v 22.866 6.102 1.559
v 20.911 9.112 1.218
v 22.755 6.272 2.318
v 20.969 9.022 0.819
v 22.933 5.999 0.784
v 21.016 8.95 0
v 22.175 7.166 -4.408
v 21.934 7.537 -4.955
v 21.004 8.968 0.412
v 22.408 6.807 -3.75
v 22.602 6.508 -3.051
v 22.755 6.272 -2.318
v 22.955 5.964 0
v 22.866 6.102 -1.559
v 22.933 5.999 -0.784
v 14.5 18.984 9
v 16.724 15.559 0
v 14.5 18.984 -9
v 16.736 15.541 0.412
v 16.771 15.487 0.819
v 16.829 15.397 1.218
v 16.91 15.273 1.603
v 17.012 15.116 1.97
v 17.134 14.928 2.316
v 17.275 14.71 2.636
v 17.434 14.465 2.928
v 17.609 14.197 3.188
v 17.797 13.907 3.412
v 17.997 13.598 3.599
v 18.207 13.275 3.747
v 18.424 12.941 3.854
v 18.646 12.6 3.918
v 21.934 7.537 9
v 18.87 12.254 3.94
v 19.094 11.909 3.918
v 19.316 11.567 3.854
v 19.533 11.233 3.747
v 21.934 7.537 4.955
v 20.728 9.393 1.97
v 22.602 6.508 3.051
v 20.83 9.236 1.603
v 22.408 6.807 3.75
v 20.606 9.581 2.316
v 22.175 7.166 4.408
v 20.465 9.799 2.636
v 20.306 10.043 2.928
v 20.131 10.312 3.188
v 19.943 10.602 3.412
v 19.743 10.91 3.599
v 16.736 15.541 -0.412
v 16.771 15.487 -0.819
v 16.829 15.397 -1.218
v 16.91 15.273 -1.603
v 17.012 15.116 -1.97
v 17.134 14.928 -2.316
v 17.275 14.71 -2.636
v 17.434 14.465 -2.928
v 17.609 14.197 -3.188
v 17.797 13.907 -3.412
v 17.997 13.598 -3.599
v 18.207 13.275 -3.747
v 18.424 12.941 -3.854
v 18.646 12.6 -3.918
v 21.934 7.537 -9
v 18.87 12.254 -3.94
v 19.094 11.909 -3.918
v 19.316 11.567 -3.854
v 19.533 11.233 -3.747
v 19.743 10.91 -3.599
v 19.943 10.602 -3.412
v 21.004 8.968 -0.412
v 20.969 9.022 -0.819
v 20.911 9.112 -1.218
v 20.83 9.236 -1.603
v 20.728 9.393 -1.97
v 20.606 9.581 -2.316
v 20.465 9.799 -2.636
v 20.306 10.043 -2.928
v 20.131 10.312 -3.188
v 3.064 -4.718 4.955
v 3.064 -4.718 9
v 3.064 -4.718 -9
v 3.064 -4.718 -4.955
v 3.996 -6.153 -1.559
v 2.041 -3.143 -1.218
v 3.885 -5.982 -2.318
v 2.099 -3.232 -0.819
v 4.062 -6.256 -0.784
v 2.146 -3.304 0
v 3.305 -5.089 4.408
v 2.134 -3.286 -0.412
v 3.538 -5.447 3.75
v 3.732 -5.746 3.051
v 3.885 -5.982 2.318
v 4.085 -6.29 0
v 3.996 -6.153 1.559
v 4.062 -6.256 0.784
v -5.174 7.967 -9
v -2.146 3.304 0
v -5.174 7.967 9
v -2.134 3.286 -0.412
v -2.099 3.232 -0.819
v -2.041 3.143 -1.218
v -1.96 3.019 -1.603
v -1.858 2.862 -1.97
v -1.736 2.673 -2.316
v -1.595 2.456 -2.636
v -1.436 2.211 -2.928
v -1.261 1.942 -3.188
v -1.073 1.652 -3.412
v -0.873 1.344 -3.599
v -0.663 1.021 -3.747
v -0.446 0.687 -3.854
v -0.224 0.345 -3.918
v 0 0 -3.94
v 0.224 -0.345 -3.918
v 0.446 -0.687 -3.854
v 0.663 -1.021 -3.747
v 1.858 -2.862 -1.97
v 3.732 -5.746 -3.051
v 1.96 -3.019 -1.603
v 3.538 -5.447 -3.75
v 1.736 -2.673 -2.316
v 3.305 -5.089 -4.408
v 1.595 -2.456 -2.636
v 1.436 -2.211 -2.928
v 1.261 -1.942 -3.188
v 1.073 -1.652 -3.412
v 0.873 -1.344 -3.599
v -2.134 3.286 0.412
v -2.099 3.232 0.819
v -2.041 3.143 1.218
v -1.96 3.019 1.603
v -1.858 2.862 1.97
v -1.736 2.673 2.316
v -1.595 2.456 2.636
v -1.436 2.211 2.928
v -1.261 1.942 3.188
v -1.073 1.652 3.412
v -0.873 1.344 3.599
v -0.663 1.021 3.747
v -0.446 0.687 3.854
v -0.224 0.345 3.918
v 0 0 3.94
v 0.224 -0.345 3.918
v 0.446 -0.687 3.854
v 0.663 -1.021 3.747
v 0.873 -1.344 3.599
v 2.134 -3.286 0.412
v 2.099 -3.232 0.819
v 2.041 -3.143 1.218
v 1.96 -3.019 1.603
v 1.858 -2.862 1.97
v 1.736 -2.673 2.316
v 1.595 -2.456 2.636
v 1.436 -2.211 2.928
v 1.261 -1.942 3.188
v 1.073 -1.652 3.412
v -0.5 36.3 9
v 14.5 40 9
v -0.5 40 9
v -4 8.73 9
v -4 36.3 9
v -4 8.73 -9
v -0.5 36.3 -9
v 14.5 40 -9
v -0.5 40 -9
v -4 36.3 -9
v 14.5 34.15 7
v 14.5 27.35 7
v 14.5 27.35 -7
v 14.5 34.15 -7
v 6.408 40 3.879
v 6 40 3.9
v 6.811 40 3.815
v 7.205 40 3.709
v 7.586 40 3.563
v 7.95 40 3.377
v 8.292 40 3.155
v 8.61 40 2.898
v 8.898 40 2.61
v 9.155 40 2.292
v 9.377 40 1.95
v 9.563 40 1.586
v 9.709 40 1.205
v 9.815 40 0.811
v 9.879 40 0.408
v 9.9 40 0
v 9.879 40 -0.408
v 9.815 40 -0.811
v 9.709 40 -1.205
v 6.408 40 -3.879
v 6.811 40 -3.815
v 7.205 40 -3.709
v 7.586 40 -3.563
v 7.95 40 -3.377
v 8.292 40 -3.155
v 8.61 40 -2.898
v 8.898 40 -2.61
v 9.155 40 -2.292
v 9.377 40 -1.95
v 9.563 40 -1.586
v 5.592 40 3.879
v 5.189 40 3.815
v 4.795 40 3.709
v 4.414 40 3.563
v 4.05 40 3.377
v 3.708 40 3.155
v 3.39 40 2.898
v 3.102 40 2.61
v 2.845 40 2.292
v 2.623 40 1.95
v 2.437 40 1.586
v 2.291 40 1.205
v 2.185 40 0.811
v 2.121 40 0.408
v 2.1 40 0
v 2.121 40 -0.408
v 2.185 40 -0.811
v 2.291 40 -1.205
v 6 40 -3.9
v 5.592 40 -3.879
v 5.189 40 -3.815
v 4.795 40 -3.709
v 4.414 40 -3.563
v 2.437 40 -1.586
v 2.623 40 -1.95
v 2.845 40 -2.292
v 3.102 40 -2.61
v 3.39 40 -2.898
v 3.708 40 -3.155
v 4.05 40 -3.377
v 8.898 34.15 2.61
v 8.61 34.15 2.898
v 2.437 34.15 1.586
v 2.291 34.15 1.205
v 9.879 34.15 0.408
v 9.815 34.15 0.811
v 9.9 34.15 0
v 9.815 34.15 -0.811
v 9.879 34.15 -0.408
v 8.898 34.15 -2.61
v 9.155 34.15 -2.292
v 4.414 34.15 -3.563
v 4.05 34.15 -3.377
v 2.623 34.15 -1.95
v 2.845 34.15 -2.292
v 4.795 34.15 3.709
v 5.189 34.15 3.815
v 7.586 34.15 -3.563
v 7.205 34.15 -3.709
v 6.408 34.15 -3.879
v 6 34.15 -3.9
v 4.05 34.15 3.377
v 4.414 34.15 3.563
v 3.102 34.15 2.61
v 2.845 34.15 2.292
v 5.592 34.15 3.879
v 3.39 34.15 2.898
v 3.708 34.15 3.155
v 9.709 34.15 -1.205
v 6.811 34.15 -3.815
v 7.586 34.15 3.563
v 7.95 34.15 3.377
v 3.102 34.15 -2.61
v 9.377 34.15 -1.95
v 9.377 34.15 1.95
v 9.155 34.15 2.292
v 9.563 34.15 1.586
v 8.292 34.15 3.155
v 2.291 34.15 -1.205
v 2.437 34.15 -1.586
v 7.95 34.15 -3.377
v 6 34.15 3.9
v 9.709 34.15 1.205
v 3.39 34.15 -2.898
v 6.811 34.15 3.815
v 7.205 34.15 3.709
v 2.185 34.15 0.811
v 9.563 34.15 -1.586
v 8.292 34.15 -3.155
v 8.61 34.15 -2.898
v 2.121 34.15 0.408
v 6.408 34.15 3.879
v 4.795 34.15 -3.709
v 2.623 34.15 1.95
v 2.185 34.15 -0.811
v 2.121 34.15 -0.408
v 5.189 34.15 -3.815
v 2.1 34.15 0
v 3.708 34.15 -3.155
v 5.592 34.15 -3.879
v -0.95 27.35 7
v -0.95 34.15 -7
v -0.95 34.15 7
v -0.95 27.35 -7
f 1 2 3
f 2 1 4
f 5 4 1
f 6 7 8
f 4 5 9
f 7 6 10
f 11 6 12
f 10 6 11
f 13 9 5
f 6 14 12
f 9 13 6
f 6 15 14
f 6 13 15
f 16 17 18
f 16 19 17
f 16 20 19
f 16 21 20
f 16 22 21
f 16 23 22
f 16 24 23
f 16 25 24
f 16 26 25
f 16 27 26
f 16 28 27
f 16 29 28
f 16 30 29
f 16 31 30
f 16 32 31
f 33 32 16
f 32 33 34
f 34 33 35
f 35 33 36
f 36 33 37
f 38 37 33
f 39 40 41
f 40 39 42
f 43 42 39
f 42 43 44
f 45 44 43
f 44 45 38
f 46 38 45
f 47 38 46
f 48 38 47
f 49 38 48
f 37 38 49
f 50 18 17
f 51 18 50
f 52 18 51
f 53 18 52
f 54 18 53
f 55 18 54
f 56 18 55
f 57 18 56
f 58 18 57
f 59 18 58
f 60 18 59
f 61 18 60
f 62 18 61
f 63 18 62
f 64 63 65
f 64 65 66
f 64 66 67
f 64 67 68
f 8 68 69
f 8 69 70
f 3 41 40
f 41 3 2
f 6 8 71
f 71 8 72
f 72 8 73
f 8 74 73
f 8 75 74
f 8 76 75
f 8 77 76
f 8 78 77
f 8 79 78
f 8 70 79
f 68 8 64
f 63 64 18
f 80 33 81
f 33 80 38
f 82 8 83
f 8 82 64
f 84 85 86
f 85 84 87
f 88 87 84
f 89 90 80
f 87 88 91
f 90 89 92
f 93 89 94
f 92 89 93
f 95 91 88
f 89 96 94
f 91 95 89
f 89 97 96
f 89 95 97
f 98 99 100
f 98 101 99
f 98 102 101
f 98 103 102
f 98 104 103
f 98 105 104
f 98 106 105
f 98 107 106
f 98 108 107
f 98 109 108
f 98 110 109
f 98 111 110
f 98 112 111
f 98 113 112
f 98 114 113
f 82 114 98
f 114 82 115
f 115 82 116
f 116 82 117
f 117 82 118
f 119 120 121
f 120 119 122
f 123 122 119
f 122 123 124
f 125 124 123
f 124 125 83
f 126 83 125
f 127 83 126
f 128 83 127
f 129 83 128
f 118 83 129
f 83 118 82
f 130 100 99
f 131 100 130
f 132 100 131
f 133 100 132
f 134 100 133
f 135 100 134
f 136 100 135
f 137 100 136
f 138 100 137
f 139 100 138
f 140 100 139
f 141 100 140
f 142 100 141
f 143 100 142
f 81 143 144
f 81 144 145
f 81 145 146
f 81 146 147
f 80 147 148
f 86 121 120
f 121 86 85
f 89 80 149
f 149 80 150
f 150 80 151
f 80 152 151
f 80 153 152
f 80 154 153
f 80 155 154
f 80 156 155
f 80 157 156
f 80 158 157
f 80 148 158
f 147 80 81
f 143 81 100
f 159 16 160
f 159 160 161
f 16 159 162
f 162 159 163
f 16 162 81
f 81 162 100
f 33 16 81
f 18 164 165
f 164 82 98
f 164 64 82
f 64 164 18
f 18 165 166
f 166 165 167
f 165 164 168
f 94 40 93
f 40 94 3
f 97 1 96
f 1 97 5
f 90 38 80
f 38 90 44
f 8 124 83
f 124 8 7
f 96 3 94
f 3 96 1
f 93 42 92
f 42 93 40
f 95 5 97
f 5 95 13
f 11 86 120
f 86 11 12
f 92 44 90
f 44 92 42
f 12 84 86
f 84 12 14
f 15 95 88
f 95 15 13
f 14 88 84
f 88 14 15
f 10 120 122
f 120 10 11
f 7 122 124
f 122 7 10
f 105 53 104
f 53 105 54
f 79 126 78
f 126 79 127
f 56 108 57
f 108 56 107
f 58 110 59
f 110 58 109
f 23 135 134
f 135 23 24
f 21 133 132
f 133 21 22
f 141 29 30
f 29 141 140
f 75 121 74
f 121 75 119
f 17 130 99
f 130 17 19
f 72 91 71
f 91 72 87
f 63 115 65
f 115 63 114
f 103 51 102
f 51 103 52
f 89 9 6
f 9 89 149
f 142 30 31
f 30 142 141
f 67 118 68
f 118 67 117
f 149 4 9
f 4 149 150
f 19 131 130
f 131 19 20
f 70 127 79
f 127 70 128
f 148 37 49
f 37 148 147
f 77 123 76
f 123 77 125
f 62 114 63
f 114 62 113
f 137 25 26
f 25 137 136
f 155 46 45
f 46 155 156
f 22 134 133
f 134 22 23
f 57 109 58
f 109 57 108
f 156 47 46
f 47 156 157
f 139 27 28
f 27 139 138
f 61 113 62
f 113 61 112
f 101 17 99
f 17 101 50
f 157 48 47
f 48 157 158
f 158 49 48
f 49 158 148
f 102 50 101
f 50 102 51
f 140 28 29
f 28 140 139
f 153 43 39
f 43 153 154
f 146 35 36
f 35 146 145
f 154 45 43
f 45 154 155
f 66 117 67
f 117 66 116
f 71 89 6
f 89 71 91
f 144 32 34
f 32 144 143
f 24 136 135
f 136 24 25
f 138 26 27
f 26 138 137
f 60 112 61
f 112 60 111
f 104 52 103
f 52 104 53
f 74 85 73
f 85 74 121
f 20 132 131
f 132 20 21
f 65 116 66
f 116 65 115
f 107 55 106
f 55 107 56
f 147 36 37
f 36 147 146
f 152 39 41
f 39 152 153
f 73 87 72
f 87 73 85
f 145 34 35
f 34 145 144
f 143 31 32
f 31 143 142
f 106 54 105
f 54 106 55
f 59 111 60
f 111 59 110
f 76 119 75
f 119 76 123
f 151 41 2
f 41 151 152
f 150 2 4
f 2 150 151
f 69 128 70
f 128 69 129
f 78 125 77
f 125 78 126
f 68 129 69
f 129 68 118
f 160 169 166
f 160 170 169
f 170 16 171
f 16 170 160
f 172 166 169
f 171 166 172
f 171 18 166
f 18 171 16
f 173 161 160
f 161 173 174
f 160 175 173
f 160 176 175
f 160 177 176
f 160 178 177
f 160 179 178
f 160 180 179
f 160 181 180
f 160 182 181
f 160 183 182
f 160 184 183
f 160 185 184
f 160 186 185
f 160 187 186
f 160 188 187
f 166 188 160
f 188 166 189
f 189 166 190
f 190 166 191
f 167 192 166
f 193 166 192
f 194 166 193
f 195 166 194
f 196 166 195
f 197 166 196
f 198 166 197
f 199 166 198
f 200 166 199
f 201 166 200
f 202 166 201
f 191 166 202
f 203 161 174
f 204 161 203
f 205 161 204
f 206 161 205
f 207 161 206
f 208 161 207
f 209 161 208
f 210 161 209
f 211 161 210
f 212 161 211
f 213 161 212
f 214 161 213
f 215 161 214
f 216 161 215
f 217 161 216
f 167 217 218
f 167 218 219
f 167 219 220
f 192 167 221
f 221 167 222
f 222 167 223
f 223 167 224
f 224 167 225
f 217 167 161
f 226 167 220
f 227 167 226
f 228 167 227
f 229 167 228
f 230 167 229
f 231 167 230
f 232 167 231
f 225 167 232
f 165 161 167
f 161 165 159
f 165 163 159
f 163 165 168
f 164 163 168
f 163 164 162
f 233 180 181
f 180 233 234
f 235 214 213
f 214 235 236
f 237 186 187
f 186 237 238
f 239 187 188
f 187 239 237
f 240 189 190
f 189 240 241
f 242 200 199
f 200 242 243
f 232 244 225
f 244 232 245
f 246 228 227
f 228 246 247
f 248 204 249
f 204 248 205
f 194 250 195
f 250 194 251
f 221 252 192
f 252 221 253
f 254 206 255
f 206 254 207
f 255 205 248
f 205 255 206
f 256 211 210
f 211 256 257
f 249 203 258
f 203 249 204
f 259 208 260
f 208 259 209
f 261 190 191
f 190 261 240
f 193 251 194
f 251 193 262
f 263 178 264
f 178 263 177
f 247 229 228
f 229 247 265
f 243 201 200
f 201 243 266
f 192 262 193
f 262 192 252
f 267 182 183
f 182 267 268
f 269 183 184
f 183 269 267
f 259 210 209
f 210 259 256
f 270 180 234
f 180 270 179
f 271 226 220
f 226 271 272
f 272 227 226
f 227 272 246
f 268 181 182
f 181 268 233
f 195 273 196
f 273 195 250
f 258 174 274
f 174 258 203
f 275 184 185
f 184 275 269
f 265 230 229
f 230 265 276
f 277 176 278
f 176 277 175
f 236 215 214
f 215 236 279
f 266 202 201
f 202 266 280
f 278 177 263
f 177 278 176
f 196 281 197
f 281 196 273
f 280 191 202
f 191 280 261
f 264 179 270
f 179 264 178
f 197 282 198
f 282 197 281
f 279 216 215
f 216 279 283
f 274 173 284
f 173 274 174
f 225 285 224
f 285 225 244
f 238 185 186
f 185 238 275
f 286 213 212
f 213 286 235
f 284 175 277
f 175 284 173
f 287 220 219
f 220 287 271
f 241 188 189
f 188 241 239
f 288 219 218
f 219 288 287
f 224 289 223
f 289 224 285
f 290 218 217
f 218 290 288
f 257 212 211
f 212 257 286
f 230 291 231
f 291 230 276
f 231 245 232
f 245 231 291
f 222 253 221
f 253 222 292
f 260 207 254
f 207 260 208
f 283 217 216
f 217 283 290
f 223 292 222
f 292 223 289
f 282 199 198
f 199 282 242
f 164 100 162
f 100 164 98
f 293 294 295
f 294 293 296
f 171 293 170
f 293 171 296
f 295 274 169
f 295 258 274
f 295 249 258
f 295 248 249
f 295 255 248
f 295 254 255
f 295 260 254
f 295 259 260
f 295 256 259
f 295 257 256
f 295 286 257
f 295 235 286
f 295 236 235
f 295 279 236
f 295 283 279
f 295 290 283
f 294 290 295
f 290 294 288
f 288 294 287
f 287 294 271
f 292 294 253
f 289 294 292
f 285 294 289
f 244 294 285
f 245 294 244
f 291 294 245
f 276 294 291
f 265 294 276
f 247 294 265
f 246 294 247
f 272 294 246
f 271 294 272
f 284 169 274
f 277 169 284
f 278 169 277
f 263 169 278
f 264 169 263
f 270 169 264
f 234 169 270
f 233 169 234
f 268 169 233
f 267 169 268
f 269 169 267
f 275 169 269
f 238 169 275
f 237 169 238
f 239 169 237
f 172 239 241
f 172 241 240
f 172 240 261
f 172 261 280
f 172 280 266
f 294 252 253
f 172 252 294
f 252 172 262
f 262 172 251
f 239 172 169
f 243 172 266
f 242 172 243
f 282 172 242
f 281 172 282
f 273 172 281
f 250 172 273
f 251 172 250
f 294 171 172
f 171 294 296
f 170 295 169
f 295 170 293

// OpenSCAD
$fn = 60;

nut_holder_length = 22.5;
nut_holder_r = 7.5;
nut_r = 3.94;

module nut_holder_middle() {
    rotate([0, 90, 0])
        cylinder(r=nut_holder_r, h=nut_holder_length);
}

sx = nut_holder_length;
sy = nut_holder_r*1.2;
sz = nut_holder_r*1.5;
module nut_holder_side() {
    translate([0, 0, -sz/2])
        cube([sx, sy, sz]);
    translate([0, -sy, -sz/2])
        cube([sx, sy, sz]);
}

module nut_holder() {
    difference() {
        union() {
            nut_holder_middle();
            nut_holder_side();
        }
        translate([-1, 0, 0])
            rotate([0, 90, 0])
                cylinder(r=nut_r, h=nut_holder_length+2);
    }
}

rod_angel = 33;
rod_holder_height = nut_holder_length+8;
rod_holder_r = nut_holder_r;
rod_r = 3.9;
m8_w = 14;
m8_l = 14;
m8_h = 6.3;
module nut_slot_for_rod() {
    rotate([0, -rod_angel, 0])
        translate([-nut_holder_r, 0, -nut_holder_r+1])
            translate([rod_holder_height, 0, -(rod_holder_height)+2])
                translate([-rod_holder_r*2-2, 0, -6]) {
                    translate([2, 0, rod_holder_height/2-5])
                        cube([m8_l+rod_r, m8_w, m8_h+0.5], center=true);
                }
}

module rod_holder() {
        translate([rod_holder_height, 0, -(rod_holder_height)+2]) {
            difference() {
                // hole wall
                union() {
                translate([-16, 0, rod_holder_height/2-5])
                    cube([rod_holder_r*2, sy*2, rod_holder_height], center=true);
                translate([-25, 0, rod_holder_height/2-2.3])
                    cube([4, sy*2, rod_holder_height-2], center=true);
                }
                // rod hole
                translate([-rod_holder_r*2-2, 0, -6]) {
                    cylinder(r=rod_r, h=rod_holder_height/2-5);
                }
            }
        }
}

module rod_holder_rotate() {
    rotate([0, -rod_angel, 0])
        translate([-nut_holder_r, 0, -nut_holder_r+1])
            rod_holder();
}

module join() {
    translate([nut_holder_length/2, 0, -nut_holder_r+1])
        cube([nut_holder_length, nut_holder_r*2+3, 6], center=true);
}

rotate([90, 0, rod_angel])
union() {
    nut_holder();
    
    difference() {
        union() {
            join();
            rod_holder_rotate();
        }
        nut_holder_middle();
        nut_slot_for_rod();
    }
}
